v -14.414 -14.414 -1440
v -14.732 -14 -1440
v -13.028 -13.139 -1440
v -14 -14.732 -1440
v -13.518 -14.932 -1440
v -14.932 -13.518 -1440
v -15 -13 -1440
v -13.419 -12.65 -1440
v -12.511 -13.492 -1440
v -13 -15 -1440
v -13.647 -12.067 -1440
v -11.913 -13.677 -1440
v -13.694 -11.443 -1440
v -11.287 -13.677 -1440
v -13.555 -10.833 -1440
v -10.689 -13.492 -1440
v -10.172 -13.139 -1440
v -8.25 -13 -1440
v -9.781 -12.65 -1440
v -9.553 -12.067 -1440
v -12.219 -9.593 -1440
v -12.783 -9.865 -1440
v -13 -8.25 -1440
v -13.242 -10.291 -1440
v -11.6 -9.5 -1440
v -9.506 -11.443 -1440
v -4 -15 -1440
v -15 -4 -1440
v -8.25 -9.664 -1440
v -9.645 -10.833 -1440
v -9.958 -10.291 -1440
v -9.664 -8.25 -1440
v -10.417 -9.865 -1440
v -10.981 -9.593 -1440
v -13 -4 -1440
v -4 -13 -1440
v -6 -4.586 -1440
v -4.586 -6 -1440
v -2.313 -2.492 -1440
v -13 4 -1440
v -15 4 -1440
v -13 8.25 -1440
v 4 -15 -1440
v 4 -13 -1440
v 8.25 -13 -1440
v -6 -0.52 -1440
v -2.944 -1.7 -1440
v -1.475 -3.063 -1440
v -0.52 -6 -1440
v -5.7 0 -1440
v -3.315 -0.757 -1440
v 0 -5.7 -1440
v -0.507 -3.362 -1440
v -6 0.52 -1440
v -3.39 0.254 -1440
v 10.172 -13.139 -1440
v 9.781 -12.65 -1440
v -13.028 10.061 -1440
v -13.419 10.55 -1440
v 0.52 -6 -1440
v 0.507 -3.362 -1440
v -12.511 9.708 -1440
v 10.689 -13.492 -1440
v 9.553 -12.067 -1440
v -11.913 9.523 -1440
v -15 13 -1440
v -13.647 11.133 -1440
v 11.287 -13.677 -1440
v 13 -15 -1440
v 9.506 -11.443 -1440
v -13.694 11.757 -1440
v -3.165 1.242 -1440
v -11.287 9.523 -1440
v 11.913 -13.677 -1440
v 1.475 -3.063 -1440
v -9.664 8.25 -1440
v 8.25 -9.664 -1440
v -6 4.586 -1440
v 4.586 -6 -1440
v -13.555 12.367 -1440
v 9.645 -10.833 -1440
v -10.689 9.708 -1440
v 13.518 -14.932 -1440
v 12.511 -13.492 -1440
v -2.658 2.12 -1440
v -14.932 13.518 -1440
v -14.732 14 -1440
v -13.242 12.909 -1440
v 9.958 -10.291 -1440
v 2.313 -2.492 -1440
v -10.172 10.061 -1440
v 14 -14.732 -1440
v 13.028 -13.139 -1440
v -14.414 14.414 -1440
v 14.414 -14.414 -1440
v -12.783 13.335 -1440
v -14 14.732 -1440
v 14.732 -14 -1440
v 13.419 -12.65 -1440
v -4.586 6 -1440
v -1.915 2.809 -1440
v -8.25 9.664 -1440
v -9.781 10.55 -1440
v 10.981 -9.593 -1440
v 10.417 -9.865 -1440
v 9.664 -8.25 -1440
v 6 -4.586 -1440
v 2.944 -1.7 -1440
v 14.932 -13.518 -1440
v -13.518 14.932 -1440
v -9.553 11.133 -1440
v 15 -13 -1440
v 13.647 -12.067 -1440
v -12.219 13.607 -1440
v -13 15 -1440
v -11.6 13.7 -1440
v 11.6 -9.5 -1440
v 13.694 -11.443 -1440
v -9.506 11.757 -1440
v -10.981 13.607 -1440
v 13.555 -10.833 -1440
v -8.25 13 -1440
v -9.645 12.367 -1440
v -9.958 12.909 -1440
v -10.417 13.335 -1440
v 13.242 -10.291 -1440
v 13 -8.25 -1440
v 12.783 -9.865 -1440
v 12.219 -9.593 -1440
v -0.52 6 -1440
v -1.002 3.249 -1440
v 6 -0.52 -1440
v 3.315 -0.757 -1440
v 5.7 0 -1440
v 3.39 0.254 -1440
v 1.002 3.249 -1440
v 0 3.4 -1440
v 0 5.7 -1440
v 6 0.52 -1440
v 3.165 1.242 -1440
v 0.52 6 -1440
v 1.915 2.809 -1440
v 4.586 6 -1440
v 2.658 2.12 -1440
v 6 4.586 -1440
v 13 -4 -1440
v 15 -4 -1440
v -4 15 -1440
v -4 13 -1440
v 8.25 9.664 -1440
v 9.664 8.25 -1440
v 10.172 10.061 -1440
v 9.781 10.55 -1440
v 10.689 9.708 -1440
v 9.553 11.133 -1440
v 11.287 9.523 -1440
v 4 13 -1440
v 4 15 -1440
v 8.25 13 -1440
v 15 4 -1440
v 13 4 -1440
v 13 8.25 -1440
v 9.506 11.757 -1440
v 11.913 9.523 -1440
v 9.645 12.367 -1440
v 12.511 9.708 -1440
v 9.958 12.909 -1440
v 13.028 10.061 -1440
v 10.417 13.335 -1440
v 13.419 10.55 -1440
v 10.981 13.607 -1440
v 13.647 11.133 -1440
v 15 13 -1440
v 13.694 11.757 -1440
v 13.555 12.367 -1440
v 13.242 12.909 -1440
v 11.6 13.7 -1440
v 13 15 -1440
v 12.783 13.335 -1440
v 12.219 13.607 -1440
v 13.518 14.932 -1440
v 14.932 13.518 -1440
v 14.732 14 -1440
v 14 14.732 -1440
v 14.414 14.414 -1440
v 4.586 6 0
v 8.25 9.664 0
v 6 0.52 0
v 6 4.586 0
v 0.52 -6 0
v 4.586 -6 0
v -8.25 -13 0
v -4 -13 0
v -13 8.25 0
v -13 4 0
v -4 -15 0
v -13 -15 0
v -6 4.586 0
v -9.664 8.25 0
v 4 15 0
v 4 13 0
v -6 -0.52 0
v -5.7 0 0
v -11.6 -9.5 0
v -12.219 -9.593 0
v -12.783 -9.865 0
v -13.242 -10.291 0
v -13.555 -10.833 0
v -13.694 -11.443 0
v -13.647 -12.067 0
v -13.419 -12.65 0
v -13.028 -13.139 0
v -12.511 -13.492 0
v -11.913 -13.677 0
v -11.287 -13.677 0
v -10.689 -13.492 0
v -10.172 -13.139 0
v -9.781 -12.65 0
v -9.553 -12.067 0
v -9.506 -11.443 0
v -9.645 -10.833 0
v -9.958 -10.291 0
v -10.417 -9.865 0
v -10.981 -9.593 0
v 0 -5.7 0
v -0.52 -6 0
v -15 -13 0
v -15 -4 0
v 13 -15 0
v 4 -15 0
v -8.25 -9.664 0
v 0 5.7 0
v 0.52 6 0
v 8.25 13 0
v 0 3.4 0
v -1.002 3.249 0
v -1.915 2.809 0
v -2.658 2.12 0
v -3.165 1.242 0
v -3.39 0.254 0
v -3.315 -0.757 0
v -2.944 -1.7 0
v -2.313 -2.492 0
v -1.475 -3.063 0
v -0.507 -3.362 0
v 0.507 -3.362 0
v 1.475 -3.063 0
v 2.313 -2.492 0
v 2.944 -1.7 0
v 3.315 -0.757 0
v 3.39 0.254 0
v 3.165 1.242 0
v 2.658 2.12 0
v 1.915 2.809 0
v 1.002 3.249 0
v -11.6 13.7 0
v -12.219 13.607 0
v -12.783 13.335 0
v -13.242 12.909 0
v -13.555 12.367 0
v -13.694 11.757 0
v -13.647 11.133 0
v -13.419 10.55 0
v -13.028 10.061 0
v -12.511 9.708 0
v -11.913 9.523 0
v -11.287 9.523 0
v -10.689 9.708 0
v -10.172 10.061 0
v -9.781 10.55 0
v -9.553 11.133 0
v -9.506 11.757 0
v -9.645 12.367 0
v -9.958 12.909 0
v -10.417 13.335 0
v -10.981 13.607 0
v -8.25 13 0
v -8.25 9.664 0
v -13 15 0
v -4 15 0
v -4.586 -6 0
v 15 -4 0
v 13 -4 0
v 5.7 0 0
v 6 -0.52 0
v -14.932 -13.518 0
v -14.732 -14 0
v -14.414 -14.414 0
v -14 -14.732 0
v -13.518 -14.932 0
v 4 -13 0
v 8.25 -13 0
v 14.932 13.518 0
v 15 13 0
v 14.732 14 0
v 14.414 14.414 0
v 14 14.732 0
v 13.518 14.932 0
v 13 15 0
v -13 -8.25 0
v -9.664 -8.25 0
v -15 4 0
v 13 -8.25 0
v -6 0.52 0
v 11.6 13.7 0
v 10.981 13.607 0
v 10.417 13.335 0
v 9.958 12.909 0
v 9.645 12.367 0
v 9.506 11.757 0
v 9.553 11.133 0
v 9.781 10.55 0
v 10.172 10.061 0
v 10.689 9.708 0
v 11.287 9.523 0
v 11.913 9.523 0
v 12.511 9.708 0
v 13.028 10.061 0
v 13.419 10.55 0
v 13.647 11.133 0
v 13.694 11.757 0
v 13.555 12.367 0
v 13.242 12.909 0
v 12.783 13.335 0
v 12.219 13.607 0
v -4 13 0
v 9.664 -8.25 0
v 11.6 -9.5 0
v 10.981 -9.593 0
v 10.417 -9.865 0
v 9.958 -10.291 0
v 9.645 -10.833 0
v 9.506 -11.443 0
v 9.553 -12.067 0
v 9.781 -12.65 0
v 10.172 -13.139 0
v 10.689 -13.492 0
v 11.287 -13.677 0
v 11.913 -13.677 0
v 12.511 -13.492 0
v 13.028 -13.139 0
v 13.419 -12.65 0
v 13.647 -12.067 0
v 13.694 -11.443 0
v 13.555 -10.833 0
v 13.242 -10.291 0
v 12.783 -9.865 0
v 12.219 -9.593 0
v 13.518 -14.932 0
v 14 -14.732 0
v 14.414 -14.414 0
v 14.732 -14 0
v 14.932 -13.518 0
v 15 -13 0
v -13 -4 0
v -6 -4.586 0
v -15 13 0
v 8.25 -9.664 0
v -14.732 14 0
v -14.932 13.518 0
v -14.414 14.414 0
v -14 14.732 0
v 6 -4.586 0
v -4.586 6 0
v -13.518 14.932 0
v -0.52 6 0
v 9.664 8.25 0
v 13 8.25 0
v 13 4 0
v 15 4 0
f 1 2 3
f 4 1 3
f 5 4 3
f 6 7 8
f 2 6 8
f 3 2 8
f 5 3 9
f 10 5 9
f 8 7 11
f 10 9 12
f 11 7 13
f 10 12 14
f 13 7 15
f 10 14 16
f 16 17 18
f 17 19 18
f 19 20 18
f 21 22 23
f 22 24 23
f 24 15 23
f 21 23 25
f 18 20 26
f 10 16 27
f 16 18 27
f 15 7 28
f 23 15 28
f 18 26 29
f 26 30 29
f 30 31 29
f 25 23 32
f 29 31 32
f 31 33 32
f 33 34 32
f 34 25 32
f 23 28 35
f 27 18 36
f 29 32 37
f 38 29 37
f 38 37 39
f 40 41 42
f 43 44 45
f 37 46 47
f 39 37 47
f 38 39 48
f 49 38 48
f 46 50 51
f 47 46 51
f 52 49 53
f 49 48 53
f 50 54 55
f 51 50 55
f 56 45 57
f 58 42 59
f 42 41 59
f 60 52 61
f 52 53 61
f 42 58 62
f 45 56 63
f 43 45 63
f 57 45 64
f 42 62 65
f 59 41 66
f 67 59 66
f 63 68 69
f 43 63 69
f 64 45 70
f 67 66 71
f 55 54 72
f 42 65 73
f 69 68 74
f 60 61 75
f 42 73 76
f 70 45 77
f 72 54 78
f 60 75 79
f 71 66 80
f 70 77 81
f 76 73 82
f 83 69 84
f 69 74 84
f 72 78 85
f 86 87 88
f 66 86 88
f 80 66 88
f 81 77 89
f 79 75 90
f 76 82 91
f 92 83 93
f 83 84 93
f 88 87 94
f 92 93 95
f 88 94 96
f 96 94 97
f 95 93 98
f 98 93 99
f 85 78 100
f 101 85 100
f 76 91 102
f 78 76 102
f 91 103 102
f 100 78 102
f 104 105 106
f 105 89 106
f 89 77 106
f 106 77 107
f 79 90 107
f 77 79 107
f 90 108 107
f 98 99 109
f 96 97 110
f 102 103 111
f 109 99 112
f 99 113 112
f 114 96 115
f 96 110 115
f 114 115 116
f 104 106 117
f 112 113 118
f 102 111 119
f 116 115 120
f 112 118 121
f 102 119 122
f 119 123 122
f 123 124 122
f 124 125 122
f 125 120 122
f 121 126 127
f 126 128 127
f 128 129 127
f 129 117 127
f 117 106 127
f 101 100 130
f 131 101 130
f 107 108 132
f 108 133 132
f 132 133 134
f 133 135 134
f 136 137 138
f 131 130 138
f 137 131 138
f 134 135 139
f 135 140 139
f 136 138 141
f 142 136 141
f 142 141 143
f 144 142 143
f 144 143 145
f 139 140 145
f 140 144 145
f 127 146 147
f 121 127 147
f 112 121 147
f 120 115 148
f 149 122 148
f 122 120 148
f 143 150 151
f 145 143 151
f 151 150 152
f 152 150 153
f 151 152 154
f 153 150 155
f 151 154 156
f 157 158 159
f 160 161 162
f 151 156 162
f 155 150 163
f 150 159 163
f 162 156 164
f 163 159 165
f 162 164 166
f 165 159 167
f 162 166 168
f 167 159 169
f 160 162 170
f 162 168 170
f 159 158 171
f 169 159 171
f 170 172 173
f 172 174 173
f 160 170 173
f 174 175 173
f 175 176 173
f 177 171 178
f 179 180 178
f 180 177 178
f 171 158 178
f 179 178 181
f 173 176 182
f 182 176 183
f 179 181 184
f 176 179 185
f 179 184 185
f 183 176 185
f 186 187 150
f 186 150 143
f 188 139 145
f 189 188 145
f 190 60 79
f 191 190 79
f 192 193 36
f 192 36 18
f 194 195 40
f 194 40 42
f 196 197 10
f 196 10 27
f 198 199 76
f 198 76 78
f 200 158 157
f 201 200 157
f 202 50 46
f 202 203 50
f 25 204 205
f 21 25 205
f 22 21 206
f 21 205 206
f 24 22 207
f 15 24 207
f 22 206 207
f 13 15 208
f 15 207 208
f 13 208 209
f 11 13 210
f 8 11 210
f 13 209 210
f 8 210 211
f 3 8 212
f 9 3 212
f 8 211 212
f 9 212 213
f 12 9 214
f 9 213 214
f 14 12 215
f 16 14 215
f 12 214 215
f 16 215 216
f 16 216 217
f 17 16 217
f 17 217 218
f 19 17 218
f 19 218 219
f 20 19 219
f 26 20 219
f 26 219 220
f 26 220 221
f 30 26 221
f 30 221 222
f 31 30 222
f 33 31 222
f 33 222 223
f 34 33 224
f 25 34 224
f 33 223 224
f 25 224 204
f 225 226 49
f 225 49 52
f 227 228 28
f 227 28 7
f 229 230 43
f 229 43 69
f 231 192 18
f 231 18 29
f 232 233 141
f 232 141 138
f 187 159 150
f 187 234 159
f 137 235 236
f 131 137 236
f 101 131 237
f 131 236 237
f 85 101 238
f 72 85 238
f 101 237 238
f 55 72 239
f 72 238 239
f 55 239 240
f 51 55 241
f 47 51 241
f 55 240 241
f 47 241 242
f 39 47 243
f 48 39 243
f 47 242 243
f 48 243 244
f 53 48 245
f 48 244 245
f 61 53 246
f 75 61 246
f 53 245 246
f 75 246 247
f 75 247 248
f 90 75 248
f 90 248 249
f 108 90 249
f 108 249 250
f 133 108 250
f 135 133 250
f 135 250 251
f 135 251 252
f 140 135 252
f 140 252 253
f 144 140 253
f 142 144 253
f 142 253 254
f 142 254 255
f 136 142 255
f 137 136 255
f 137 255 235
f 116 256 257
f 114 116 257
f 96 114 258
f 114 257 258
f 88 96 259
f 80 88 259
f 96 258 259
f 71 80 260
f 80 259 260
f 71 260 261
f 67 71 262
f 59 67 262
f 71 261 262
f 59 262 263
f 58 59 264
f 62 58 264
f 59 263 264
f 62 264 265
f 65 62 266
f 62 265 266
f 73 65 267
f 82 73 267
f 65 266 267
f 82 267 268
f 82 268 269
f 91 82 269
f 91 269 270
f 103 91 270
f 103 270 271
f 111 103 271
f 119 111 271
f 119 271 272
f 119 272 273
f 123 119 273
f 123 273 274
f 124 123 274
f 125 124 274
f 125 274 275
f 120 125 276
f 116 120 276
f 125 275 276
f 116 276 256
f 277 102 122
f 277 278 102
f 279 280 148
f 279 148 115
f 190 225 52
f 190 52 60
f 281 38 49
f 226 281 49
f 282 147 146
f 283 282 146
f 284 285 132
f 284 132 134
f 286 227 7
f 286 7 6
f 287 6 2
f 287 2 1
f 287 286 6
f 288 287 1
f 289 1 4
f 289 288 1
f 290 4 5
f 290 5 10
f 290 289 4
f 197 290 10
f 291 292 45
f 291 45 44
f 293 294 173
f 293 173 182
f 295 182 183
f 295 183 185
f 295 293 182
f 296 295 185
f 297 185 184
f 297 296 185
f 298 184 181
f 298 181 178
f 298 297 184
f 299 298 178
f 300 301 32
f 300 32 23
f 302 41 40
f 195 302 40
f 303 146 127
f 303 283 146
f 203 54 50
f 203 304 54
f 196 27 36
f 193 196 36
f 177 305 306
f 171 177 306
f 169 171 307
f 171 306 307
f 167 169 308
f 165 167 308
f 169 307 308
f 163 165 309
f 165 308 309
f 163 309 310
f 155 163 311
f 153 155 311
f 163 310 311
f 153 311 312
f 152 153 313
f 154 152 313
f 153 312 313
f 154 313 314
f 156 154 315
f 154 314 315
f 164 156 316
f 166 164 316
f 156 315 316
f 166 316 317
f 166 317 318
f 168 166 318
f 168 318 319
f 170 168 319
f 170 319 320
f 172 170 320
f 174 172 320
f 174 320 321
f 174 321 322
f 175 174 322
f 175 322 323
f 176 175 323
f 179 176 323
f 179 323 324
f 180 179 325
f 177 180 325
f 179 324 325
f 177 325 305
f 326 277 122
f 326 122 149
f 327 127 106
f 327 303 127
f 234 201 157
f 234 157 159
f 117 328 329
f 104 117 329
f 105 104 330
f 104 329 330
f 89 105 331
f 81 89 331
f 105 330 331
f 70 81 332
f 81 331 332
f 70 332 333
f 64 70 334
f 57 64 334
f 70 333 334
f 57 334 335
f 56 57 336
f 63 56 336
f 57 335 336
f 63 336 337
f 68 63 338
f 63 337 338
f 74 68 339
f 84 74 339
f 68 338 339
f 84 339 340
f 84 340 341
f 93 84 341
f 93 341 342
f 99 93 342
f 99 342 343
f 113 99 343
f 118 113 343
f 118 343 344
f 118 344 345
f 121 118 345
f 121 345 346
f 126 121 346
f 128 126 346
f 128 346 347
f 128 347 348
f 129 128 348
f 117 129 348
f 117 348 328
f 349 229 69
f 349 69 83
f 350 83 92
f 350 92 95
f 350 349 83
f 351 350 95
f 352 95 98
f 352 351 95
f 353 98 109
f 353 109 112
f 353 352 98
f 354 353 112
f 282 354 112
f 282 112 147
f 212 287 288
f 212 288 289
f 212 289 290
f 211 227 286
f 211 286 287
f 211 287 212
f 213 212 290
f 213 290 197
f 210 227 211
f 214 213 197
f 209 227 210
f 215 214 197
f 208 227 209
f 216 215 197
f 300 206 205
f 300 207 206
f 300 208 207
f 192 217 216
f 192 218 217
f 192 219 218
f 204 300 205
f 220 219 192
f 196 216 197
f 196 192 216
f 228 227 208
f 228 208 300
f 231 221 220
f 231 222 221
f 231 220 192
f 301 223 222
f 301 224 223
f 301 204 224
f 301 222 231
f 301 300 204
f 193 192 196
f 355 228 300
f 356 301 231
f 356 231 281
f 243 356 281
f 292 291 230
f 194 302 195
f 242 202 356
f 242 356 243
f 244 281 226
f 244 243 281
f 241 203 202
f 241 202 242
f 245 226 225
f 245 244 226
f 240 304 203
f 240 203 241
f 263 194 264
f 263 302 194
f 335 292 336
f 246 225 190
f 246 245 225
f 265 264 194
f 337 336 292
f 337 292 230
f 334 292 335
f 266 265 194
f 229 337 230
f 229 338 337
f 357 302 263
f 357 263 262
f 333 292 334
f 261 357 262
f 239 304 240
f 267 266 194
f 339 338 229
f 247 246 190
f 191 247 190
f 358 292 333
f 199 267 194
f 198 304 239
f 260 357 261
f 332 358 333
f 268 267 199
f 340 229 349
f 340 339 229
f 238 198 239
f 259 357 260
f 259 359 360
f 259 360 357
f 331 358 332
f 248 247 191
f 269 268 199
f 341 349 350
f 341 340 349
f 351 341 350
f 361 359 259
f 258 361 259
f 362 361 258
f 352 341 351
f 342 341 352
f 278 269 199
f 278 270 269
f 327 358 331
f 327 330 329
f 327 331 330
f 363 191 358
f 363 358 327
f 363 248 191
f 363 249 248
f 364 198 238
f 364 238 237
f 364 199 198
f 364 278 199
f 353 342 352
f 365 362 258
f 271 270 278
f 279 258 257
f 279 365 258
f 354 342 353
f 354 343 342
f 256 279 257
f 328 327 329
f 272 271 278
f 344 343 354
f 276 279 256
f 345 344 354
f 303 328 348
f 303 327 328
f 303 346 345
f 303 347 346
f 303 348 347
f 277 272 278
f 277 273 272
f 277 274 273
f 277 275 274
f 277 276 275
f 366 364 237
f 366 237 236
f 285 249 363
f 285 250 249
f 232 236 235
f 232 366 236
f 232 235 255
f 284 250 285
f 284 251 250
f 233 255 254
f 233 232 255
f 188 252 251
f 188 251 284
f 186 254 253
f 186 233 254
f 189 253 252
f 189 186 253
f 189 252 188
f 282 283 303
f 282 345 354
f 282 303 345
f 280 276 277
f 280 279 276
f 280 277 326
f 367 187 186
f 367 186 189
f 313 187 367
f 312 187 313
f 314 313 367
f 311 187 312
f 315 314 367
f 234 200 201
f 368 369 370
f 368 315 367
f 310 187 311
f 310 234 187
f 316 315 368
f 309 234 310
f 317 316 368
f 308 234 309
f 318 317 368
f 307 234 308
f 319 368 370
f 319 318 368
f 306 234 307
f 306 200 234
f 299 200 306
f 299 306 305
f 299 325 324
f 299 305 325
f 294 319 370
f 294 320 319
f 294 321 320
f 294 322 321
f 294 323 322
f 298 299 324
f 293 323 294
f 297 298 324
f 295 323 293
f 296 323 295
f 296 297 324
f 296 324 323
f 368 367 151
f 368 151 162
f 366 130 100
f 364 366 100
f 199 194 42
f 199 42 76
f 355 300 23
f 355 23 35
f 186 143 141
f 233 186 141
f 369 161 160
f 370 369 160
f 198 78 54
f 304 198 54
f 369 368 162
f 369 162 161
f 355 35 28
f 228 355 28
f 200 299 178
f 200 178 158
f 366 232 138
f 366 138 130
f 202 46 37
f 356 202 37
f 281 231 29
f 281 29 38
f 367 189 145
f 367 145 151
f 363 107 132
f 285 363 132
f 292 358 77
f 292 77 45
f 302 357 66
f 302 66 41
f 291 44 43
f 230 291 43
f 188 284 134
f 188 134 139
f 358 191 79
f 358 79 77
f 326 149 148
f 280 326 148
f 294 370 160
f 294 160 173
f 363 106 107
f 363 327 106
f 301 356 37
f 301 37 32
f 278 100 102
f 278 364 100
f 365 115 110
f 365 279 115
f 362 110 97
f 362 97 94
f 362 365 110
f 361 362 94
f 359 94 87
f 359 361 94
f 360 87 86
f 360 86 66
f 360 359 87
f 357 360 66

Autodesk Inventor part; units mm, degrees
sketch "Sketch_1" plane through (0, 0, 0) normal (0, 0, 1) x (1, 0, 0)
  line L0 (-15, -4) -> (-15, -13)
  arc A0 (-15, -13) -> (-13, -15) centre (-13, -13) ccw
  line L1 (-13, -15) -> (-4, -15)
  line L2 (-4, -15) -> (-4, -13)
  line L3 (-4, -13) -> (-8.25, -13)
  line L4 (-8.25, -13) -> (-8.25, -9.6642)
  line L5 (-8.25, -9.6642) -> (-4.5858, -6)
  line L6 (-4.5858, -6) -> (-0.5196, -6)
  line L7 (-0.5196, -6) -> (0, -5.7)
  line L8 (0, -5.7) -> (0.5196, -6)
  line L9 (0.5196, -6) -> (4.5858, -6)
  line L10 (4.5858, -6) -> (8.25, -9.6642)
  line L11 (8.25, -9.6642) -> (8.25, -13)
  line L12 (8.25, -13) -> (4, -13)
  line L13 (4, -13) -> (4, -15)
  line L14 (4, -15) -> (13, -15)
  arc A1 (13, -15) -> (15, -13) centre (13, -13) ccw
  line L15 (15, -13) -> (15, -4)
  line L16 (15, -4) -> (13, -4)
  line L17 (13, -4) -> (13, -8.25)
  line L18 (13, -8.25) -> (9.6642, -8.25)
  line L19 (9.6642, -8.25) -> (6, -4.5858)
  line L20 (6, -4.5858) -> (6, -0.5196)
  line L21 (6, -0.5196) -> (5.7, 0)
  line L22 (5.7, 0) -> (6, 0.5196)
  line L23 (6, 0.5196) -> (6, 4.5858)
  line L24 (6, 4.5858) -> (9.6642, 8.25)
  line L25 (9.6642, 8.25) -> (13, 8.25)
  line L26 (13, 8.25) -> (13, 4)
  line L27 (13, 4) -> (15, 4)
  line L28 (15, 4) -> (15, 13)
  arc A2 (15, 13) -> (13, 15) centre (13, 13) ccw
  line L29 (13, 15) -> (4, 15)
  line L30 (4, 15) -> (4, 13)
  line L31 (4, 13) -> (8.25, 13)
  line L32 (8.25, 13) -> (8.25, 9.6642)
  line L33 (8.25, 9.6642) -> (4.5858, 6)
  line L34 (4.5858, 6) -> (0.5196, 6)
  line L35 (0.5196, 6) -> (0, 5.7)
  line L36 (0, 5.7) -> (-0.5196, 6)
  line L37 (-0.5196, 6) -> (-4.5858, 6)
  line L38 (-4.5858, 6) -> (-8.25, 9.6642)
  line L39 (-8.25, 9.6642) -> (-8.25, 13)
  line L40 (-8.25, 13) -> (-4, 13)
  line L41 (-4, 13) -> (-4, 15)
  line L42 (-4, 15) -> (-13, 15)
  arc A3 (-13, 15) -> (-15, 13) centre (-13, 13) ccw
  line L43 (-15, 13) -> (-15, 4)
  line L44 (-15, 4) -> (-13, 4)
  line L45 (-13, 4) -> (-13, 8.25)
  line L46 (-13, 8.25) -> (-9.6642, 8.25)
  line L47 (-9.6642, 8.25) -> (-6, 4.5858)
  line L48 (-6, 4.5858) -> (-6, 0.5196)
  line L49 (-6, 0.5196) -> (-5.7, 0)
  line L50 (-5.7, 0) -> (-6, -0.5196)
  line L51 (-6, -0.5196) -> (-6, -4.5858)
  line L52 (-6, -4.5858) -> (-9.6642, -8.25)
  line L53 (-9.6642, -8.25) -> (-13, -8.25)
  line L54 (-13, -8.25) -> (-13, -4)
  line L55 (-13, -4) -> (-15, -4)
extrude "Extrusion1" add sketch "Sketch_1" against normal blind 1440
sketch "Sketch2" plane through (0, 0, -1440) normal (0, 0, -1) x (-1, 0, 0)
  point P0 (0, 0)
hole "Hole1" at (0, 0, -1440) direction (0, 0, 1) diameter 6.8 depth 1440
sketch "Sketch3" plane through (0, 0, -1440) normal (0, 0, -1) x (-1, 0, 0)
  point P0 (-11.6, 11.6)
hole "Hole2" at (11.6, 11.6, -1440) direction (0, 0, 1) diameter 4.2 depth 1440
pattern_linear "Rectangular Pattern1" count 2 spacing 23.2 along (-1, 0, 0) count 2 spacing 23.2 along (0, -1, 0) of "Hole2"
ref_plane "C1_XY" through (0, 0, 0) normal (0, 0, 1) x (1, 0, 0)
ref_plane "C1_YZ" through (0, 0, 0) normal (1, 0, 0) x (0, 1, 0)
ref_plane "C1_ZX" through (0, 0, 0) normal (0, 1, 0) x (0, 0, 1)
ref_plane "to_frame_cap1_XY" through (0, 0, 0) normal (0, 0, 1) x (1, 0, 0)
ref_plane "to_frame_cap1_YZ" through (0, 0, 0) normal (1, 0, 0) x (0, 1, 0)
ref_plane "to_frame_cap1_ZX" through (0, 0, 0) normal (0, 1, 0) x (0, 0, 1)
ref_plane "to_frame_cap2_XY" through (0, 0, -1440) normal (0, 0, -1) x (1, 0, 0)
ref_plane "to_frame_cap2_YZ" through (0, 0, -1440) normal (1, 0, 0) x (0, -1, 0)
ref_plane "to_frame_cap2_ZX" through (0, 0, -1440) normal (0, -1, 0) x (0, 0, -1)
properties part number "HFS6-3030-1440"
